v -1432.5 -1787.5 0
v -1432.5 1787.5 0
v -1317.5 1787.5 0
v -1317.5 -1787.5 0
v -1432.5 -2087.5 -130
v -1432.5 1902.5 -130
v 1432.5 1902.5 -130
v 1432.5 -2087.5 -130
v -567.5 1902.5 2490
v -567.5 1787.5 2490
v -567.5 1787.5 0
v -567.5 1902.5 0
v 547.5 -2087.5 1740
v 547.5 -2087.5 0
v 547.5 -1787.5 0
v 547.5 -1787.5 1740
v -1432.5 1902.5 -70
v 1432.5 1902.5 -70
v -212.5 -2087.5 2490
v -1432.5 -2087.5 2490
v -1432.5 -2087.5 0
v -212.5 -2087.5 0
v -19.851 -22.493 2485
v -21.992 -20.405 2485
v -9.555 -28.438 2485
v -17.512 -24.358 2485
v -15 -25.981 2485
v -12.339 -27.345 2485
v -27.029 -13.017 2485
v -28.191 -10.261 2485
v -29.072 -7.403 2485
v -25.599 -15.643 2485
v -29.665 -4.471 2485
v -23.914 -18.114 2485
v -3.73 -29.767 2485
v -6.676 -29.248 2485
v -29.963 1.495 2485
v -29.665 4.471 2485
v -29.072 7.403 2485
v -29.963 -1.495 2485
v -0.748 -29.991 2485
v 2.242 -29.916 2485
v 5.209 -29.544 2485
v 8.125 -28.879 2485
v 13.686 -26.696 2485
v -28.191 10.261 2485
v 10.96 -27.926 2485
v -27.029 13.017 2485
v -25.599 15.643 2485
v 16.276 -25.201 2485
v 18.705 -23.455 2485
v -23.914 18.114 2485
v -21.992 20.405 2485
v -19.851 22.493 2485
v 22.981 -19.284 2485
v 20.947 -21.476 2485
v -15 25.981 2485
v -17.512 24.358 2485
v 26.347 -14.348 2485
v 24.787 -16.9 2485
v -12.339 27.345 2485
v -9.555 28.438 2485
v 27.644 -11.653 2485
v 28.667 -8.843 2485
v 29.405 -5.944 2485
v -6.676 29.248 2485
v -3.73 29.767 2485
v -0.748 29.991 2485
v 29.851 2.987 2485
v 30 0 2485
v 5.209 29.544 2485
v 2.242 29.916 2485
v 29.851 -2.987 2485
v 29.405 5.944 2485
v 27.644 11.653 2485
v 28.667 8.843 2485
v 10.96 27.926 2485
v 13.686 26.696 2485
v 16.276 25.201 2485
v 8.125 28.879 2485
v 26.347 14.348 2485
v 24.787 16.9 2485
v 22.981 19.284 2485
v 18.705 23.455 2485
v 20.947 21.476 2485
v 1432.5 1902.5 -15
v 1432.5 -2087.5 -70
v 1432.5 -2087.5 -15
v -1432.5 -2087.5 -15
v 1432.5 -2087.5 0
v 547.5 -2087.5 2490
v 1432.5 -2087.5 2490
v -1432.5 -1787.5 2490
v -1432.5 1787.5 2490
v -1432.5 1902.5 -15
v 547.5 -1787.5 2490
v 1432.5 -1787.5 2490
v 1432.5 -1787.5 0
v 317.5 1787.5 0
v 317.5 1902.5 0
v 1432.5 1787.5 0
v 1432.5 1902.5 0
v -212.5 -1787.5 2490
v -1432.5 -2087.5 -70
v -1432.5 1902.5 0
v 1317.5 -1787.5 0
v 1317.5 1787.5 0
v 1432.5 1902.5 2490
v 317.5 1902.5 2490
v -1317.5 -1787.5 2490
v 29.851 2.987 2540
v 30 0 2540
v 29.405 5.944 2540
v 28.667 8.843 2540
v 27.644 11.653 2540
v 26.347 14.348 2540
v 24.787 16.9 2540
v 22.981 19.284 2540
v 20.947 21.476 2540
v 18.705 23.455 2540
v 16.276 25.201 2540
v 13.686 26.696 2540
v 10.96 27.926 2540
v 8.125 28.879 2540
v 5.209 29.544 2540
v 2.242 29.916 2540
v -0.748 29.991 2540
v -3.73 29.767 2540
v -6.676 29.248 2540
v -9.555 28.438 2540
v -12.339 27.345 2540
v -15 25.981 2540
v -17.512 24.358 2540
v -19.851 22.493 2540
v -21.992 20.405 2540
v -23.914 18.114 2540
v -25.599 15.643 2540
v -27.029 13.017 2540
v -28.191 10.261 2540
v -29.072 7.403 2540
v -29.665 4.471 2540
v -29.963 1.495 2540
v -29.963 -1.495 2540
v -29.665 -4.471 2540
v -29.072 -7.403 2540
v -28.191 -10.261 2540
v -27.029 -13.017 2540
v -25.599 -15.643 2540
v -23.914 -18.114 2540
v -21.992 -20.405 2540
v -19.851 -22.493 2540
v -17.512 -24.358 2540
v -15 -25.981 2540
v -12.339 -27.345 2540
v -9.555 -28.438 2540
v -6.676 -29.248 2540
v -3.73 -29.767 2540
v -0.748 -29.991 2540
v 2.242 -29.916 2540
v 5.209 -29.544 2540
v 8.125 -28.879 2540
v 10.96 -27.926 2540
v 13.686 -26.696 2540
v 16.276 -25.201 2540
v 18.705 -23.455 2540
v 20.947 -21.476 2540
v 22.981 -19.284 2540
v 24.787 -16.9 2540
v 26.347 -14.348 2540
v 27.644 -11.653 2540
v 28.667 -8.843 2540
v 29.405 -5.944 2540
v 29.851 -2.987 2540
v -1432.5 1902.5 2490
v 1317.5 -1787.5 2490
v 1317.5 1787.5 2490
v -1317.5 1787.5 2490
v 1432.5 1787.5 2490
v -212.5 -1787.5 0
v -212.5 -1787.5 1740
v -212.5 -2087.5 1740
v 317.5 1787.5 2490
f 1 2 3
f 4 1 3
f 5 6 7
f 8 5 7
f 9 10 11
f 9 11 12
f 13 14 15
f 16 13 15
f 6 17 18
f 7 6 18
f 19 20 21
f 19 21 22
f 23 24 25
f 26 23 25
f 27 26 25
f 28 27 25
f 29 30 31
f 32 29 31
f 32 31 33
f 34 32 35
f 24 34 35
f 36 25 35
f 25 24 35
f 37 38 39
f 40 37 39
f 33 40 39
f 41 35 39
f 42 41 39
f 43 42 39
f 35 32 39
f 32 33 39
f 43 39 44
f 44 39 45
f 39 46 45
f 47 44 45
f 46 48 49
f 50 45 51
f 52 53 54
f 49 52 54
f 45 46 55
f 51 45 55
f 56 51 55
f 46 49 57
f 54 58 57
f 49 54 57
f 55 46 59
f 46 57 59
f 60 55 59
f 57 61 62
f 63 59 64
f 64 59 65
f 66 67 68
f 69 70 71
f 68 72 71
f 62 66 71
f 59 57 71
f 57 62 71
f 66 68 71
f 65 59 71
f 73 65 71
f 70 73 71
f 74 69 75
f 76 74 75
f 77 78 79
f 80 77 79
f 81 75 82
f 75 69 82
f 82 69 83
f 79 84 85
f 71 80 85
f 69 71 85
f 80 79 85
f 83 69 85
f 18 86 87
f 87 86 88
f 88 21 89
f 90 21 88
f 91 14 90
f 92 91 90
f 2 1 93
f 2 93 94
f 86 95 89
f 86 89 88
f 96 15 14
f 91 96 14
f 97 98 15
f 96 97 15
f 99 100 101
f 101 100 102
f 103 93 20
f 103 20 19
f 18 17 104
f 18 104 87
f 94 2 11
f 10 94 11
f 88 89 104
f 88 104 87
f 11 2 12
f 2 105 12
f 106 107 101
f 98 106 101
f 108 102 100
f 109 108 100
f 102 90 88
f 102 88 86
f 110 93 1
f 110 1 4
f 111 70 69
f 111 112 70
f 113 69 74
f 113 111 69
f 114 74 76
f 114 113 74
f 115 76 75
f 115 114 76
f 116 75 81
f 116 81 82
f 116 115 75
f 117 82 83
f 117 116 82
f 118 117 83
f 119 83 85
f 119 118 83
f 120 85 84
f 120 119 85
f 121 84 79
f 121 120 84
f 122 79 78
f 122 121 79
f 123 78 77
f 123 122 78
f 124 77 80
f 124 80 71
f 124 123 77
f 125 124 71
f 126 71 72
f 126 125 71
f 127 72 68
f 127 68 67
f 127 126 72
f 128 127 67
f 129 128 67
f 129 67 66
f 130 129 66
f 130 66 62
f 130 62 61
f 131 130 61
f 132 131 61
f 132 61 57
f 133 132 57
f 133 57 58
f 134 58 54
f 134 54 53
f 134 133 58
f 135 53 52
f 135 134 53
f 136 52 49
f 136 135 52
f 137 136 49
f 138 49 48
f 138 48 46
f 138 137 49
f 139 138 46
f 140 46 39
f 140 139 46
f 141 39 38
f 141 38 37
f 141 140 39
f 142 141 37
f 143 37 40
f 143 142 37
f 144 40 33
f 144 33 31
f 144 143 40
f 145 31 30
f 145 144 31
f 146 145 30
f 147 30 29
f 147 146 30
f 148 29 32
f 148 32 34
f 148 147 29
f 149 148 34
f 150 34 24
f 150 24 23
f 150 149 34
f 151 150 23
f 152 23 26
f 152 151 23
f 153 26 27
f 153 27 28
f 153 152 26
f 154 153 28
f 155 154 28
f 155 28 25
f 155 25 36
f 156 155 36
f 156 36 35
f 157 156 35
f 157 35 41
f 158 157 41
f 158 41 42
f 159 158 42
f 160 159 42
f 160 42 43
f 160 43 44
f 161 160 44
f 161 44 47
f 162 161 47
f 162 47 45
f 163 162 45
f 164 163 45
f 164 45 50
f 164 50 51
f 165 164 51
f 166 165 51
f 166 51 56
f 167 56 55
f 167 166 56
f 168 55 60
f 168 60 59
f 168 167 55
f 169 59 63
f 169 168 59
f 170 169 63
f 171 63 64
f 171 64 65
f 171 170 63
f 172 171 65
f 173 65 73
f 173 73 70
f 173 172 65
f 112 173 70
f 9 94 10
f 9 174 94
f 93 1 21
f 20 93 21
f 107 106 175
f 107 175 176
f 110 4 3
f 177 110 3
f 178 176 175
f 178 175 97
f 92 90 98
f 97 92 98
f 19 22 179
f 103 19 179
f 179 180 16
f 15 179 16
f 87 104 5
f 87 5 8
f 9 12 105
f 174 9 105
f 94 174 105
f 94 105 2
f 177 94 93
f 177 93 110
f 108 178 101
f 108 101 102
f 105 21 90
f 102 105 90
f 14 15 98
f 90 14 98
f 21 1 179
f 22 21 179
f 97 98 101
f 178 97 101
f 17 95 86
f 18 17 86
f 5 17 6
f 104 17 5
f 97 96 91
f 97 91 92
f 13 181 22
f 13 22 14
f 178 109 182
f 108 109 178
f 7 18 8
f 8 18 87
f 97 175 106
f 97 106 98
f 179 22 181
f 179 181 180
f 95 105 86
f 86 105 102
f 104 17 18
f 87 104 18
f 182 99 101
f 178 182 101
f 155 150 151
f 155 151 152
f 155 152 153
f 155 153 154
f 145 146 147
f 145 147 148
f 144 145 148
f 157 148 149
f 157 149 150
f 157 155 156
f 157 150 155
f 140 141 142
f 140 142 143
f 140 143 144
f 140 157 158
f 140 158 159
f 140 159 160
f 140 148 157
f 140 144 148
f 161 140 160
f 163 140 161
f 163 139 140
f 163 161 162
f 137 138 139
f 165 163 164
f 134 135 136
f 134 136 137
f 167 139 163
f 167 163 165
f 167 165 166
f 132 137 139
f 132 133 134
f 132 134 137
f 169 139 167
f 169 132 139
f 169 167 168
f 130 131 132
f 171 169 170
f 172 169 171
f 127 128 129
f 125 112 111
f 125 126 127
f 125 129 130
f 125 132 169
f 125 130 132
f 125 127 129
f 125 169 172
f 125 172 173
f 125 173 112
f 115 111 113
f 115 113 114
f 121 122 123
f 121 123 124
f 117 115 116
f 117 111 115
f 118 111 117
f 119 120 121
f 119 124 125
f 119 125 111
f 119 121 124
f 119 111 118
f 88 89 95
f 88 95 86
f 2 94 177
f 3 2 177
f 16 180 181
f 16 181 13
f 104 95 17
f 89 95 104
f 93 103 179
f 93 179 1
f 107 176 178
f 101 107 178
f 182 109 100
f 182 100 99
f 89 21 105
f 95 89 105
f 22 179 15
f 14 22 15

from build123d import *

# Parameters (mm, degrees)
F1_W           = 2865
F1_H           = 3990
F2_DEPTH       = 15
F3_W           = 2865
F3_H           = 3990
F4_DEPTH       = 55
F5_W           = 2865
F5_H           = 3990
F6_DEPTH       = 60
F0_W           = 115
F0_H           = 3575
F9_DEPTH       = 2490
F10_DEPTH      = 2490
F11_DEPTH      = 2490
F0_W_2         = 760
F0_H_2         = 300
F12_DEPTH      = 1740
F14_R          = 30
F15_DEPTH      = 50
F15_DEPTH_BACK = 5


with BuildPart() as f2:
    # F1 (on Top) → F2 (new body)
    with BuildSketch(Plane.XY):
        with Locations((0, -92.5)):
            Rectangle(F1_W, F1_H)
    extrude(amount=-F2_DEPTH)


with BuildPart() as f4:
    # F3 (on face) → F4 (new body)
    with BuildSketch(Plane(origin=(0, 0, -15), x_dir=(1, 0, 0), z_dir=(0, 0, -1))):
        with Locations((0, 92.5)):
            Rectangle(F3_W, F3_H)
    extrude(amount=F4_DEPTH)


with BuildPart() as f6:
    # F5 (on face) → F6 (new body)
    with BuildSketch(Plane(origin=(0, 0, -70), x_dir=(1, 0, 0), z_dir=(0, 0, -1))):
        with Locations((0, 92.5)):
            Rectangle(F5_W, F5_H)
    extrude(amount=F6_DEPTH)


with BuildPart() as f9:
    # F0 (on Top) → F9 (new body)
    with BuildSketch(Plane.XY):
        with Locations((-1375, 0)):
            Rectangle(F0_W, F0_H)
    extrude(amount=F9_DEPTH)


with BuildPart() as f9b:
    # F0 (on Top) → F9, piece 2 (new body)
    with BuildSketch(Plane.XY):
        with Locations((1375, 0)):
            Rectangle(F0_W, F0_H)
    extrude(amount=F9_DEPTH)


with BuildPart() as f10:
    # F0 (on Top) → F10 (new body)
    with BuildSketch(Plane.XY):
        Polygon((-1432.5, 1787.5), (-1317.5, 1787.5), (-567.5, 1787.5), (-567.5, 1902.5), (-1432.5, 1902.5), align=None)
    extrude(amount=F10_DEPTH)


with BuildPart() as f10b:
    # F0 (on Top) → F10, piece 2 (new body)
    with BuildSketch(Plane.XY):
        Polygon((317.5, 1787.5), (1317.5, 1787.5), (1432.5, 1787.5), (1432.5, 1902.5), (317.5, 1902.5), align=None)
    extrude(amount=F10_DEPTH)


with BuildPart() as f11:
    # F0 (on Top) → F11 (new body)
    with BuildSketch(Plane.XY):
        Polygon((-212.5, -1787.5), (-1317.5, -1787.5), (-1432.5, -1787.5), (-1432.5, -2087.5), (-212.5, -2087.5), align=None)
    extrude(amount=F11_DEPTH)


with BuildPart() as f11b:
    # F0 (on Top) → F11, piece 2 (new body)
    with BuildSketch(Plane.XY):
        Polygon((1317.5, -1787.5), (547.5, -1787.5), (547.5, -2087.5), (1432.5, -2087.5), (1432.5, -1787.5), align=None)
    extrude(amount=F11_DEPTH)


with BuildPart() as f12:
    # F0 (on Top) → F12 (new body)
    with BuildSketch(Plane.XY):
        with Locations((167.5, -1937.5)):
            Rectangle(F0_W_2, F0_H_2)
    extrude(amount=F12_DEPTH)


with BuildPart() as f15:
    # F14 (on face) → F15 (new body, two sides)
    with BuildSketch(Plane.XY.offset(2490)) as f15_sk:
        Circle(F14_R)
    extrude(amount=F15_DEPTH)
    extrude(f15_sk.sketch, amount=-F15_DEPTH_BACK)


solid = Compound([f2.part, f4.part, f6.part, f9.part, f9b.part, f10.part, f10b.part, f11.part, f11b.part, f12.part, f15.part])
